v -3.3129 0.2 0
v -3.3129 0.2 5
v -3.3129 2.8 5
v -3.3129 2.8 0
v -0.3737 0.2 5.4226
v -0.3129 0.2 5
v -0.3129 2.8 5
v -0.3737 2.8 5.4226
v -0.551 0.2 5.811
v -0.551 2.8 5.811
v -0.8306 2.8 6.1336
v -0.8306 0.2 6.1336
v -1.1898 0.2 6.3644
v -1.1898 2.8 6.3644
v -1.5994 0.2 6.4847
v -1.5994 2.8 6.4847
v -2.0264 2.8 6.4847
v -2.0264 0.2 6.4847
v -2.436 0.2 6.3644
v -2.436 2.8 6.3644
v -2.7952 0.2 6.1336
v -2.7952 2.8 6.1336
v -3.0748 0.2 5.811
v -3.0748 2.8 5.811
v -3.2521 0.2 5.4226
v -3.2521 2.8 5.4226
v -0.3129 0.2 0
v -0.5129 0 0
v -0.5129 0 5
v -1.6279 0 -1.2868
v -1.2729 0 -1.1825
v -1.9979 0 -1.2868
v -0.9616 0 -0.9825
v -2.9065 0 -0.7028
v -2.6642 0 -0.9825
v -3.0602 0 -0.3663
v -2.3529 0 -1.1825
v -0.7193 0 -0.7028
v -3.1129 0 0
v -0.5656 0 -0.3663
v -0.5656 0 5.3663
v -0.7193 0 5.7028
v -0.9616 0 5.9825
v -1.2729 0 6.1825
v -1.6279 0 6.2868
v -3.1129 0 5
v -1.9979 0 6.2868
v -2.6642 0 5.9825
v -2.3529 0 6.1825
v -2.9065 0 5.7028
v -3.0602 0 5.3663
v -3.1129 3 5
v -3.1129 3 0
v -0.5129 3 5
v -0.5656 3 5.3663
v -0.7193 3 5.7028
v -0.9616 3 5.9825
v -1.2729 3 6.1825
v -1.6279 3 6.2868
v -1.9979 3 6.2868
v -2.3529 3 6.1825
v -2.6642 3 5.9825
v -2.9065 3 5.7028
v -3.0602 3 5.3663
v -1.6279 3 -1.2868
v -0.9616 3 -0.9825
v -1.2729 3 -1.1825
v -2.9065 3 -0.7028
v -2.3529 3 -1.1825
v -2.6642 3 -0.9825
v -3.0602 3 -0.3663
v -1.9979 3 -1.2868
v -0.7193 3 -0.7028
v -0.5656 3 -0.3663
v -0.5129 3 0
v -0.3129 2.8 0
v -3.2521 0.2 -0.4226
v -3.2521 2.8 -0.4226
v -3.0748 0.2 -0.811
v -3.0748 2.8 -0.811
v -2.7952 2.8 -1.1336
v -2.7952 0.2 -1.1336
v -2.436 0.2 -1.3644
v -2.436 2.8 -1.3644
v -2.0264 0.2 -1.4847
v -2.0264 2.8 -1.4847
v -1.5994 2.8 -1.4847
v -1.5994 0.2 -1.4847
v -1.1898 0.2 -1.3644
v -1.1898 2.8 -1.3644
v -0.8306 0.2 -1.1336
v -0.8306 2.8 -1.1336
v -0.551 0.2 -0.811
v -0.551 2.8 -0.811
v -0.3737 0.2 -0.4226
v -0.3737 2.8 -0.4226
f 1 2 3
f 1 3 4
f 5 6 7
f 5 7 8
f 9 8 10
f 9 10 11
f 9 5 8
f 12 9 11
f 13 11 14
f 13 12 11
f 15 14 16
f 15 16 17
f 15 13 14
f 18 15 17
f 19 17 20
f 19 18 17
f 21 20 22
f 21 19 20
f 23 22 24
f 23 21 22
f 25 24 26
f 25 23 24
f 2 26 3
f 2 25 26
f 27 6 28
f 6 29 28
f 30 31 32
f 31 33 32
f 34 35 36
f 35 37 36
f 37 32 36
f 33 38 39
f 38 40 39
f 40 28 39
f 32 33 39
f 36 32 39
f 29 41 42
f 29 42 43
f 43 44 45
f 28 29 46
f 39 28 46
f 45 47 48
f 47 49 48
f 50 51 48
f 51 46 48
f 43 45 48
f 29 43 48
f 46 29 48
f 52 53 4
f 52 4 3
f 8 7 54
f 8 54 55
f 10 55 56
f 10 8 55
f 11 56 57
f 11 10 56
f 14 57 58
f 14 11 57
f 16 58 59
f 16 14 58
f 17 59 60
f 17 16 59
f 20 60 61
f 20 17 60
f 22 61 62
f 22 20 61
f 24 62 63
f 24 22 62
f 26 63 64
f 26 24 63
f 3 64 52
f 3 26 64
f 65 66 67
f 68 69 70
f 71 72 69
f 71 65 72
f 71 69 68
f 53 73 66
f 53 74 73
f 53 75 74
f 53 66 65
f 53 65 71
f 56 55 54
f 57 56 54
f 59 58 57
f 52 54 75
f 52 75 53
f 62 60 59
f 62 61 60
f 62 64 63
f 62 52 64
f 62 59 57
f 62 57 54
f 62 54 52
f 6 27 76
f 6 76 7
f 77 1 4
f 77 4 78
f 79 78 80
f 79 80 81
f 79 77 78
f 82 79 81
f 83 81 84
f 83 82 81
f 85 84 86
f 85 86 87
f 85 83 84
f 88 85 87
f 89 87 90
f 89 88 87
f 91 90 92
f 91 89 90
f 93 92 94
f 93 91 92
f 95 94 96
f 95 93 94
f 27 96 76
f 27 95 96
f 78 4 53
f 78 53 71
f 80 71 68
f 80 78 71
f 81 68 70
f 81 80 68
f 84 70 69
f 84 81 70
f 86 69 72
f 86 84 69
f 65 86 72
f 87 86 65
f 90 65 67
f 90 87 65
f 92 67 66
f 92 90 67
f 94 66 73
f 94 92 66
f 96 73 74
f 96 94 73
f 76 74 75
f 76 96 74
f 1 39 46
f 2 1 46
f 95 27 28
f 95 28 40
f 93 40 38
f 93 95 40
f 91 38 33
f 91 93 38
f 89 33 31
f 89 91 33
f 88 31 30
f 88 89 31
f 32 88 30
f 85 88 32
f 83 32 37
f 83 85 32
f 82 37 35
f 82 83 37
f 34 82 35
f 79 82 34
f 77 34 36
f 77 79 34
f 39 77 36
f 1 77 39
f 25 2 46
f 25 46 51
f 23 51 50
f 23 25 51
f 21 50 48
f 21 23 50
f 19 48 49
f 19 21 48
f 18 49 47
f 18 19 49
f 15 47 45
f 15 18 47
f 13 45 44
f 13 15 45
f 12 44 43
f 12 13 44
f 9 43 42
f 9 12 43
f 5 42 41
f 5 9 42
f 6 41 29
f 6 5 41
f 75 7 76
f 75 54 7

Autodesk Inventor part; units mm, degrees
ref_plane "YZ Plane" through (0, 0, 0) normal (1, 0, 0) x (0, 1, 0)
ref_plane "XZ Plane" through (0, 0, 0) normal (0, 1, 0) x (-1, 0, 0)
ref_plane "XY Plane" through (0, 0, 0) normal (0, 0, 1) x (1, 0, 0)
sketch "Sketch1" plane through (0, 0, 0) normal (0, 1, 0) x (-1, 0, 0)
  line L0 (0.3129, 0) -> (0.3129, 5)
  line L1 (3.3129, 5) -> (3.3129, 0)
  arc A0 (3.3129, 5) -> (0.3129, 5) centre (1.8129, 5) ccw
  arc A1 (0.3129, 0) -> (3.3129, 0) centre (1.8129, 0) ccw
  point P0 (0, 0)
  dimension "d1" = 5
  dimension "d7" = 3
extrude "Extrusion1" add sketch "Sketch1" along normal blind 3
chamfer "Chamfer1" distance 0.2 angle 45 8 edges at (-0.3129, 3, 2.5) (-1.8129, 3, -1.5) (-1.8129, 3, 6.5) (-3.3129, 3, 2.5) (-0.3129, 0, 2.5) (-1.8129, 0, 6.5) (-3.3129, 0, 2.5) (-1.8129, 0, -1.5)
properties part number "feather_key" material "Stainless Steel"
